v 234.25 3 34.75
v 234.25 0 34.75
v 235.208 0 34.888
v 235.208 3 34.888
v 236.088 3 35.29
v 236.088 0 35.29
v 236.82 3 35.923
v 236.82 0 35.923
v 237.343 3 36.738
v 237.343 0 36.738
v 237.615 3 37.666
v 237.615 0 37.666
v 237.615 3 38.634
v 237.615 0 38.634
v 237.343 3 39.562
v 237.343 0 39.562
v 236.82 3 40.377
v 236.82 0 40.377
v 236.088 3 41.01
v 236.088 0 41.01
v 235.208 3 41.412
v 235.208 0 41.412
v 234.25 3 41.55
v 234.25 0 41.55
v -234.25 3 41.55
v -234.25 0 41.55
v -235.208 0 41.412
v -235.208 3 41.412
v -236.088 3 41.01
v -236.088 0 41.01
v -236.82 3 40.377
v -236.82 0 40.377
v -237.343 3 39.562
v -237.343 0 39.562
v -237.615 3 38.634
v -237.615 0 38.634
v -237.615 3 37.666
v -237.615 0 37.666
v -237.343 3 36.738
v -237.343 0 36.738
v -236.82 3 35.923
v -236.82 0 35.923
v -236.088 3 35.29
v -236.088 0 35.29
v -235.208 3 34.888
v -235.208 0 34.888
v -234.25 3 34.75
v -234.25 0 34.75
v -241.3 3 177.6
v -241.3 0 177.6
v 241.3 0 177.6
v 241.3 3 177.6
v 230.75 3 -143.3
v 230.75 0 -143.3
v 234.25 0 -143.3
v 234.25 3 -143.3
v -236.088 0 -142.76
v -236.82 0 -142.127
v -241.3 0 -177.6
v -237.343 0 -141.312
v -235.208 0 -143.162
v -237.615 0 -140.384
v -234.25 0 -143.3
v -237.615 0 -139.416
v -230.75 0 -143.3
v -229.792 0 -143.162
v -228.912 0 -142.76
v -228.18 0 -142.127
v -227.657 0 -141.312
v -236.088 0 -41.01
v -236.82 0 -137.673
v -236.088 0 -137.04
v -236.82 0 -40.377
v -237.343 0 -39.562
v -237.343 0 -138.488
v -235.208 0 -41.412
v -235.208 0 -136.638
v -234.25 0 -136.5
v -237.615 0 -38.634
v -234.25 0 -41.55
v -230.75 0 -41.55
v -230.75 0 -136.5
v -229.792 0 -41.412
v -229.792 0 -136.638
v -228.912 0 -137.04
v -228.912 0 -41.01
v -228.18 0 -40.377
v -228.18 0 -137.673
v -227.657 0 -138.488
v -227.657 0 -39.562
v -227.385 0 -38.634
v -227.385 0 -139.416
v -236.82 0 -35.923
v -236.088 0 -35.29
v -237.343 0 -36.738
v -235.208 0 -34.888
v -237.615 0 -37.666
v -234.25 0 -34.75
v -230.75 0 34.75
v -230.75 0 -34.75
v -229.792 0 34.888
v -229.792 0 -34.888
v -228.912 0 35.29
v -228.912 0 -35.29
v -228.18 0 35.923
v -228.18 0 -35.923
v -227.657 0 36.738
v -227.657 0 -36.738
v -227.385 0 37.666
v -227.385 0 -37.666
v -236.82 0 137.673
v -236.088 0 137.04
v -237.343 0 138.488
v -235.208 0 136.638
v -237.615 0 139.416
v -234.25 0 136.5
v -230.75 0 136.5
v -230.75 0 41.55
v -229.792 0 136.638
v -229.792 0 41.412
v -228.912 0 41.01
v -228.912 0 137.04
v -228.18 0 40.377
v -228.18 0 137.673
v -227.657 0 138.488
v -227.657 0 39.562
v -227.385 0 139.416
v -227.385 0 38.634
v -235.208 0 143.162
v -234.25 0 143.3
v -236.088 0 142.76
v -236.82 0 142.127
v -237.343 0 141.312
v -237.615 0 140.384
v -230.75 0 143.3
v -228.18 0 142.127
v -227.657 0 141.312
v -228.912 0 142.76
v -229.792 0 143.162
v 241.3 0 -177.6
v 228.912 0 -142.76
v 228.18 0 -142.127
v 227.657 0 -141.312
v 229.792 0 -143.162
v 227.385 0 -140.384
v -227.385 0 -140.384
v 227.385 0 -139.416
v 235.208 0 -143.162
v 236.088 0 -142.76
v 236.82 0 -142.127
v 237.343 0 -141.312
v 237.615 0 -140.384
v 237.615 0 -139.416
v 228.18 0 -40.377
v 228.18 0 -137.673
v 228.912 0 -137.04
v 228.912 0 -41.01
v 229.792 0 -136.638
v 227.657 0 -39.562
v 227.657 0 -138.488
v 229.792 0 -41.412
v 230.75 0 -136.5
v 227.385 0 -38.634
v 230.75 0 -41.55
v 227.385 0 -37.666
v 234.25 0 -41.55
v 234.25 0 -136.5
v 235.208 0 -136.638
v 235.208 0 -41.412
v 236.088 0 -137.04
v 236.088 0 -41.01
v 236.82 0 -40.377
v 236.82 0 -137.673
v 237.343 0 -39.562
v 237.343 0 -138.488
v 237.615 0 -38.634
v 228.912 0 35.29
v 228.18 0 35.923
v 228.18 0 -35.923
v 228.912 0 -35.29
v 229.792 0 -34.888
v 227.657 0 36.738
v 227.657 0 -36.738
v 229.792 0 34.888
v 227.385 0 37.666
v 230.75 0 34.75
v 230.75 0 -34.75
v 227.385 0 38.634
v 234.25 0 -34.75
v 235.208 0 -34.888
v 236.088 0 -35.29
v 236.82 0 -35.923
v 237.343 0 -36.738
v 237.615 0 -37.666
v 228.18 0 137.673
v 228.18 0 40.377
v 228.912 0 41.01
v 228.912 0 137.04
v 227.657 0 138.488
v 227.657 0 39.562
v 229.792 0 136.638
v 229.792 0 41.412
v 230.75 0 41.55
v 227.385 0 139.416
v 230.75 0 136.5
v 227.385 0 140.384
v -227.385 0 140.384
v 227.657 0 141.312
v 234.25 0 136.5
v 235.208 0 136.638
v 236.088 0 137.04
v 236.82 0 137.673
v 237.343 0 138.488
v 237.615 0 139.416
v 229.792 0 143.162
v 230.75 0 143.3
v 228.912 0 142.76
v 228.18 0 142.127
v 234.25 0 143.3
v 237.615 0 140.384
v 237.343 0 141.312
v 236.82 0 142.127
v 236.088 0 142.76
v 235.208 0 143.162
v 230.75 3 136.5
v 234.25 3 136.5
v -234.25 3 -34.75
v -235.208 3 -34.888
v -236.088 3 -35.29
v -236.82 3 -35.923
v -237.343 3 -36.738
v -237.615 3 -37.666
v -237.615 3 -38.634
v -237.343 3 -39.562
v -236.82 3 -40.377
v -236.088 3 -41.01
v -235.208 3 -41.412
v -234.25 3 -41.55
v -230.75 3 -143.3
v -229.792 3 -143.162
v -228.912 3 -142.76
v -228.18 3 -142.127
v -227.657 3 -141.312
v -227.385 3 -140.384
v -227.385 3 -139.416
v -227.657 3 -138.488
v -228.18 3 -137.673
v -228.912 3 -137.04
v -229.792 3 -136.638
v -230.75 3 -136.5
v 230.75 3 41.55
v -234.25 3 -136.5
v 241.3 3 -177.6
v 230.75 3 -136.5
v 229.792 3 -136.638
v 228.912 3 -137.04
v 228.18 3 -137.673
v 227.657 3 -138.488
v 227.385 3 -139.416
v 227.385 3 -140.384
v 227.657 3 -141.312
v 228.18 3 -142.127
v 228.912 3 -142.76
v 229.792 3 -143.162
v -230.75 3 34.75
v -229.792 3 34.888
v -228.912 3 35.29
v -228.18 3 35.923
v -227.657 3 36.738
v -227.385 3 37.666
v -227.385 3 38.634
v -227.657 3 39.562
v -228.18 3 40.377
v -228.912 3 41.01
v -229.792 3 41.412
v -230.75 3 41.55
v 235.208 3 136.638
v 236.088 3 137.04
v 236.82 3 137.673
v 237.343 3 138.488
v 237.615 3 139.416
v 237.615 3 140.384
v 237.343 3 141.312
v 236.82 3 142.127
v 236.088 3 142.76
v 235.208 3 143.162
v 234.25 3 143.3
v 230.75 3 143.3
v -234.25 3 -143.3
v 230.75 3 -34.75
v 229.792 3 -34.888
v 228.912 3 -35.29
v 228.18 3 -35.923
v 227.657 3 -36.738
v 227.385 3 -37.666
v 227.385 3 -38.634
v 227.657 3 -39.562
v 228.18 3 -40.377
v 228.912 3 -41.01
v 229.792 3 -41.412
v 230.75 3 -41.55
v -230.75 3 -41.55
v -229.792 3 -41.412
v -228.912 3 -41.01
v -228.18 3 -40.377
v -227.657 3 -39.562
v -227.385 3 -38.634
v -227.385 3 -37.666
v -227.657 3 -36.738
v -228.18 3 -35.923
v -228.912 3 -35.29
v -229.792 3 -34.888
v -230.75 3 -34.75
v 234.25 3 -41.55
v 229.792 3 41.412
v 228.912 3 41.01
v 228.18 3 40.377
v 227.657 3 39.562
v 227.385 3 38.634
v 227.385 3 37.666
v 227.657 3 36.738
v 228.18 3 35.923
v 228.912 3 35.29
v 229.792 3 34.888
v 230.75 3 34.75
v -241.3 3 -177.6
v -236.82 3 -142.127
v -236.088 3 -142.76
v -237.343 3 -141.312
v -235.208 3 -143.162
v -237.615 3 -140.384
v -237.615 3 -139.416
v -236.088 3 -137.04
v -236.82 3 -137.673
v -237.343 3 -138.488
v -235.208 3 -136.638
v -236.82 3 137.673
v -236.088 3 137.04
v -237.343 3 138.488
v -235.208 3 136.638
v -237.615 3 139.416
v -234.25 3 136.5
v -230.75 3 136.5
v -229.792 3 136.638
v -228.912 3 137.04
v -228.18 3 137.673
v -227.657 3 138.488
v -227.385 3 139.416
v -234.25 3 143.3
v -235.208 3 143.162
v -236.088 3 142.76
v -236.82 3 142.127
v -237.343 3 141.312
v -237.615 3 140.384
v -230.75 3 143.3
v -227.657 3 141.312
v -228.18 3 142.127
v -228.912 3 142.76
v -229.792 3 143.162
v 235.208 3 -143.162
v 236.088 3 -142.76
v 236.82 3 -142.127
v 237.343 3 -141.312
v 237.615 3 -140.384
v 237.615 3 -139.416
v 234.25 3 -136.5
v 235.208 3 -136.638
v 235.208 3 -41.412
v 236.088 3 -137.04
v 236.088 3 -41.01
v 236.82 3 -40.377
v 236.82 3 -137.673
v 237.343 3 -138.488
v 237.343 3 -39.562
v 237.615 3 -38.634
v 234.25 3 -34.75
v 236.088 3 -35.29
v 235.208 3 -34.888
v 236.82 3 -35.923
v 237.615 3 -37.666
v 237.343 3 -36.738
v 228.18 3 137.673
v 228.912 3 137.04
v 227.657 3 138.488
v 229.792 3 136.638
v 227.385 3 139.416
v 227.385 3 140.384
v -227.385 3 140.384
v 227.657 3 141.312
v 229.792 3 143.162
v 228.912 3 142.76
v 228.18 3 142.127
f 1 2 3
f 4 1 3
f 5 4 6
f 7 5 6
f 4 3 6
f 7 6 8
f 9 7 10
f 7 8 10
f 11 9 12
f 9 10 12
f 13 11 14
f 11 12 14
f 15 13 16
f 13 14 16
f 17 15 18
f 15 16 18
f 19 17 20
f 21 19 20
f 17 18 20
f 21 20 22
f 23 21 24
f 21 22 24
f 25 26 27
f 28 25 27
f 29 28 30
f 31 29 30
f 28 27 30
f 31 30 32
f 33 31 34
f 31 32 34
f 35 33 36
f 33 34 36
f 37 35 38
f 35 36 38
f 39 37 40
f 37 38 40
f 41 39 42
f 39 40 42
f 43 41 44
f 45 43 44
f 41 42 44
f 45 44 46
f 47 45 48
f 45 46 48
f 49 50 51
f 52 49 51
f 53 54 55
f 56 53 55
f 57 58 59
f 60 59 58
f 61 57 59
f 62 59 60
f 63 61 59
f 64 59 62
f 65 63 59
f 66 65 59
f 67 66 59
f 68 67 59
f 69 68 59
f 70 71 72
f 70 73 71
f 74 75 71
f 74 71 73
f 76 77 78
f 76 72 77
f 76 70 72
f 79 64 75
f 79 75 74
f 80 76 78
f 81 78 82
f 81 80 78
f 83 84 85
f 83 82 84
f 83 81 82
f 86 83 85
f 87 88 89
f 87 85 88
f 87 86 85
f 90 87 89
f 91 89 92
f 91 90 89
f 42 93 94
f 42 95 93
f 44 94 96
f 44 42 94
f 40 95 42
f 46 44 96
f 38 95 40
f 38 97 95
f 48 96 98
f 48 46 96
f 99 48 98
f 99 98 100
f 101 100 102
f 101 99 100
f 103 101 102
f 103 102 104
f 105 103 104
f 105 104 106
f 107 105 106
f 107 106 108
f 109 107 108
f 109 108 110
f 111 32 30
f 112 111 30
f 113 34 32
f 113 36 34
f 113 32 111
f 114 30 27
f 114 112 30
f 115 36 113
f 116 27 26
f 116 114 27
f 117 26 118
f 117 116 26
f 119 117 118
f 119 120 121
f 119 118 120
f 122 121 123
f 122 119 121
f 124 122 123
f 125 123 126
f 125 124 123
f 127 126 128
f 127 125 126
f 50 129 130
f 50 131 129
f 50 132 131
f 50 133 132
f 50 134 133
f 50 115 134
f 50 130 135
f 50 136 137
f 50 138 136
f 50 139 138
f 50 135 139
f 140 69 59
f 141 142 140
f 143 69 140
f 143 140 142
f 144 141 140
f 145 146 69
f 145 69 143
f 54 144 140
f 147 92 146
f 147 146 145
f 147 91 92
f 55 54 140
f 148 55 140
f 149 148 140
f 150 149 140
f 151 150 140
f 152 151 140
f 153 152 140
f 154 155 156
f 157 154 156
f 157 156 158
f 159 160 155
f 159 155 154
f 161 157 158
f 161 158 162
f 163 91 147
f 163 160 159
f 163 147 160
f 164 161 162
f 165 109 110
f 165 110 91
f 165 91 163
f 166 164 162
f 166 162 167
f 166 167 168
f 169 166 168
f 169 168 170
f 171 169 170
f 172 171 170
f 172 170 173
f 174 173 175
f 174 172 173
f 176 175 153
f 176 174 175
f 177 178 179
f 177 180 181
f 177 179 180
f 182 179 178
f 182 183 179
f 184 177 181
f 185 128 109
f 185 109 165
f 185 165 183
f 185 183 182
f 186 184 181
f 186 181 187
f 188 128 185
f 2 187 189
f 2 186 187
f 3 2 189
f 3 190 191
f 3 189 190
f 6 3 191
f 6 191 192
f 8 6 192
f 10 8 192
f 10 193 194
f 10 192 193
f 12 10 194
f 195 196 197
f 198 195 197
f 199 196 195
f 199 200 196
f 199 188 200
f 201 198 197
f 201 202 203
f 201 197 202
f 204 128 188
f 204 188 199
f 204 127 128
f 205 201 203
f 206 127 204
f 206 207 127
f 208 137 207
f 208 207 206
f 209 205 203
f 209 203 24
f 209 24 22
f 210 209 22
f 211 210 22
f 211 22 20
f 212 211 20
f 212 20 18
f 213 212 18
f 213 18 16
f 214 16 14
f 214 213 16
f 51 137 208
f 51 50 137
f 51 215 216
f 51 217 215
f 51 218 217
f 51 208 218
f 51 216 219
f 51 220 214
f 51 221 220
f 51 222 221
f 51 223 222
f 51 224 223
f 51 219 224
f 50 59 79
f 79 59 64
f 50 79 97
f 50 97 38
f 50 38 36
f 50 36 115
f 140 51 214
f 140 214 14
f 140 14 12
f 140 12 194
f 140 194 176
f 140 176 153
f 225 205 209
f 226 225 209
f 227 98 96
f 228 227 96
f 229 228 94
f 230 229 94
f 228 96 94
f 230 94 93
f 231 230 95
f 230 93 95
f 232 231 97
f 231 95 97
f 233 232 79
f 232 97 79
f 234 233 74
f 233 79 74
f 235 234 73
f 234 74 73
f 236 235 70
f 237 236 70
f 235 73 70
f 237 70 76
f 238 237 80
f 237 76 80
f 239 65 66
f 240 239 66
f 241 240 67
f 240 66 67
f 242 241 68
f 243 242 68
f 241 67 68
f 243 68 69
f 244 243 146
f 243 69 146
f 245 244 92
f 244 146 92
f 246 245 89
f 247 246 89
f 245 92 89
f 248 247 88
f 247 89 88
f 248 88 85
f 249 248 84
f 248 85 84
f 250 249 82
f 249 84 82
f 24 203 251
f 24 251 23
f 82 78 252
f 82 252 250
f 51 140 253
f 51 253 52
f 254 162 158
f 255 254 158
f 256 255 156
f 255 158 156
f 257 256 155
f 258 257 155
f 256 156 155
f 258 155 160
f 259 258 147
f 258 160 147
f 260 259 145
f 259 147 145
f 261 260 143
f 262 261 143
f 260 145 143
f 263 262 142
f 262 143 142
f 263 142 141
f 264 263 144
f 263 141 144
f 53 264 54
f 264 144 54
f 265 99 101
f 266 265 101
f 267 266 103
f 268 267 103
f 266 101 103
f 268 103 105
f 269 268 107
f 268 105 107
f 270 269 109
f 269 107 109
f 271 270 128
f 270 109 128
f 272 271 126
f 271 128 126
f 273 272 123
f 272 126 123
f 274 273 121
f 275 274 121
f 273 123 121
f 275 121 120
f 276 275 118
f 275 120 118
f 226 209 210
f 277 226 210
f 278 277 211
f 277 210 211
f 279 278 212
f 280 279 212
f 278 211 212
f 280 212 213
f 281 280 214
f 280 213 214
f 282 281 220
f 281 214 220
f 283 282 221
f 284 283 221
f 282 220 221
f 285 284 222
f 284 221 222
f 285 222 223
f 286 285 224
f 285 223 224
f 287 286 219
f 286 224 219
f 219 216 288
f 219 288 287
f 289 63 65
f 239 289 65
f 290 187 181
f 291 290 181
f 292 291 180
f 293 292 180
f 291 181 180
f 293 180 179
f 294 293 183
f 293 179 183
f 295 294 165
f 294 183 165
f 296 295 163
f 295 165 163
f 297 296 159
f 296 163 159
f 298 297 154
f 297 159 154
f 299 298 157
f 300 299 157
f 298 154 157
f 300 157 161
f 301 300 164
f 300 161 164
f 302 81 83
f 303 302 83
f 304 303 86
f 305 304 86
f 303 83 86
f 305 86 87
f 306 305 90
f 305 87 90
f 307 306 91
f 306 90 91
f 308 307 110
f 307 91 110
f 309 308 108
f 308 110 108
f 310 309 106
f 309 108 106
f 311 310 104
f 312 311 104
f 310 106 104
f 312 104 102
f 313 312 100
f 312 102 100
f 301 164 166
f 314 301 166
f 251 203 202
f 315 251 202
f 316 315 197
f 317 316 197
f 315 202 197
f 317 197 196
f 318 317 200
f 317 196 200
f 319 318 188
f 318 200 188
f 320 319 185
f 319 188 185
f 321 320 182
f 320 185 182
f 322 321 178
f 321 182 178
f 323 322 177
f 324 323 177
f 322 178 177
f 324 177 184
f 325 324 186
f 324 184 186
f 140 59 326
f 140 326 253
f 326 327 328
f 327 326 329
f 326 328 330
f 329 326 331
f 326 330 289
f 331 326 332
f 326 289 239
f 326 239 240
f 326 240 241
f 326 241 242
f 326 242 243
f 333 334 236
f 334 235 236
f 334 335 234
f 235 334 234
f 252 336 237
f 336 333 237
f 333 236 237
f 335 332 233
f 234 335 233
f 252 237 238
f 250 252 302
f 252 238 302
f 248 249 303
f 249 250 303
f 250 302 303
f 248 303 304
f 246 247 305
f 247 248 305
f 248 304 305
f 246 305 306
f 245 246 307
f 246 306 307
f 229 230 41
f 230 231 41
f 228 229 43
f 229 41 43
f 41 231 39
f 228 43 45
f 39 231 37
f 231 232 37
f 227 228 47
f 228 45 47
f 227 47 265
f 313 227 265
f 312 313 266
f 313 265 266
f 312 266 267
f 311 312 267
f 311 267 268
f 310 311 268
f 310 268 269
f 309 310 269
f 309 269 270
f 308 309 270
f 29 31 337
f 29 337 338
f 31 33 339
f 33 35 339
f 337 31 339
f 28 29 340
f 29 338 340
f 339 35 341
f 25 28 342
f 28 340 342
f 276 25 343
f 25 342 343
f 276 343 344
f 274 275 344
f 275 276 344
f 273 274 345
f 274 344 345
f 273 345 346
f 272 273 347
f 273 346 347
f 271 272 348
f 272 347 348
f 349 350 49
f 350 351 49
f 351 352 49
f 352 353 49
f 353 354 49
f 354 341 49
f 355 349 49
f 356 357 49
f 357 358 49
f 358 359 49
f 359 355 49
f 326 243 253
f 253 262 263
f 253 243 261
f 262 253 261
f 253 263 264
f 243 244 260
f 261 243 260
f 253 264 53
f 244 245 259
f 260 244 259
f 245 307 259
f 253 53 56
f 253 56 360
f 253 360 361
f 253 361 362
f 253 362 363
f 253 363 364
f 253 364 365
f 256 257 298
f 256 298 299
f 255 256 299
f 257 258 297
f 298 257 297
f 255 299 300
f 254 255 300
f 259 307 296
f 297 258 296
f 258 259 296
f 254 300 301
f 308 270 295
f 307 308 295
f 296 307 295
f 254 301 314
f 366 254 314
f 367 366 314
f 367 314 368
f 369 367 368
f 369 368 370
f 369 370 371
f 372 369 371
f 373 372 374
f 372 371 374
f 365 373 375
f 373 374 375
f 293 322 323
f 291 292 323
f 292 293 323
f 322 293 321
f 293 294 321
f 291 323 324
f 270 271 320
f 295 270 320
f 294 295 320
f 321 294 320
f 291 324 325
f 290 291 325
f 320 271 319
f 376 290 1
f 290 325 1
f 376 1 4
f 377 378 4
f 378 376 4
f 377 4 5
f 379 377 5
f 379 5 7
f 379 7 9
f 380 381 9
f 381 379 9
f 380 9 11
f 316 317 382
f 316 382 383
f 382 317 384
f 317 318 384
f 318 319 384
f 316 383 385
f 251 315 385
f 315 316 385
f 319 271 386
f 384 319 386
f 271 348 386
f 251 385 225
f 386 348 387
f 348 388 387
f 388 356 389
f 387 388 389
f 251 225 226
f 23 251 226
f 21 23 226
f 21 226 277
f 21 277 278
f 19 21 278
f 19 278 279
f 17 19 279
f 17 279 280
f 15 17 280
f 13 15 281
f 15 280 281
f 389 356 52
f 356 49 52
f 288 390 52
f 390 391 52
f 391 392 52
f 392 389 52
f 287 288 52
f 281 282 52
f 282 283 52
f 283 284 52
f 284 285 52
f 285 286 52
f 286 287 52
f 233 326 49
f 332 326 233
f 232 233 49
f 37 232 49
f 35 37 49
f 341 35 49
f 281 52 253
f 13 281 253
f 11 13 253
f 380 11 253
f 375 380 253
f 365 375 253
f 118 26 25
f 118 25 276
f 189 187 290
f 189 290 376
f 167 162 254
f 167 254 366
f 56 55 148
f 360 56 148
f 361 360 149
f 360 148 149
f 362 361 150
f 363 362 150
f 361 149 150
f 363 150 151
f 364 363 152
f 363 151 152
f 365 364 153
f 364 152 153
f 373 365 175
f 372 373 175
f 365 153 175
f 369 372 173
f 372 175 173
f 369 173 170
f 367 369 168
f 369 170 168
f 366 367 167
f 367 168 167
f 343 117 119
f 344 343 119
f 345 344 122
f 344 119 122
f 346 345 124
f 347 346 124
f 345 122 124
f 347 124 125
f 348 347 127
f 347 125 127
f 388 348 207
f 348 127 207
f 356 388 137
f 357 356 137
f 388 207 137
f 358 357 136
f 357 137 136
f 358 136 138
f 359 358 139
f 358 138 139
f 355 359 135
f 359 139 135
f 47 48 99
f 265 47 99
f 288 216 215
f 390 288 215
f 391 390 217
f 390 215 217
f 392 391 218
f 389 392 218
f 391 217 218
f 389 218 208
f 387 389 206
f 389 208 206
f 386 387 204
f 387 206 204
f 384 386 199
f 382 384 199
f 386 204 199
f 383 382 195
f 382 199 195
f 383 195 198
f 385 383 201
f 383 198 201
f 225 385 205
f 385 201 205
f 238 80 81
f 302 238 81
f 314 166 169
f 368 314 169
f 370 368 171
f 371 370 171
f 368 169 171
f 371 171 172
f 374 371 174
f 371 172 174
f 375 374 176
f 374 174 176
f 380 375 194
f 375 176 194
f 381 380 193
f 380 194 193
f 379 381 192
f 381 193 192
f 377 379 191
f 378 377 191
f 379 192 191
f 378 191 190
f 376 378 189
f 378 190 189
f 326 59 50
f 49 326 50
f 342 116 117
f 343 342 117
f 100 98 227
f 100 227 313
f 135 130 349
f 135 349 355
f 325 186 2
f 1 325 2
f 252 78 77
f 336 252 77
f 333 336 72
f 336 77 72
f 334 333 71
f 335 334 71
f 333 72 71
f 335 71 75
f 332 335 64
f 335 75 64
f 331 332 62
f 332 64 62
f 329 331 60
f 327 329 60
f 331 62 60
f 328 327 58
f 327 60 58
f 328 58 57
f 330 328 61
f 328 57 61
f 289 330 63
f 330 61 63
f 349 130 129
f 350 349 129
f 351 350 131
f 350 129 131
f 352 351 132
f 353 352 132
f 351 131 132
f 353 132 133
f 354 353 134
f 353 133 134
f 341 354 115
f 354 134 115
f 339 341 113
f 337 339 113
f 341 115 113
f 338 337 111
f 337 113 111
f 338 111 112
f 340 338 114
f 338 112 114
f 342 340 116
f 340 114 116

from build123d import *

# Parameters (mm, degrees)
F0_W      = 482.6
F0_H      = 355.2
F1_DEPTH  = 3
F2_W      = 3.5
F2_H      = 6.8
F3_W      = 3.5
F3_H      = 6.8
F4_W      = 3.5
F4_H      = 6.8
F5_W      = 3.5
F5_H      = 6.8
F6_DEPTH  = 3
F7_W      = 3.5
F7_H      = 6.8
F8_W      = 3.5
F8_H      = 6.8
F9_W      = 3.5
F9_H      = 6.8
F10_W     = 3.5
F10_H     = 6.8
F11_DEPTH = 3


with BuildPart() as f1:
    # F0 (on Front) → F1 (new body)
    with BuildSketch(Plane.XZ):
        Rectangle(F0_W, F0_H)
    extrude(amount=-F1_DEPTH)

    # F2 (on face) + F3 (on face) + F4 (on face) + F5 (on face) → F6 (cut)
    with BuildSketch(Plane.XZ):
        with Locations((-232.5, 139.9)):
            Rectangle(F2_W, F2_H)
        with BuildLine():
            Line((-230.75, 143.3), (-230.75, 136.5))
            ThreePointArc((-230.75, 136.5), (-227.35, 139.9), (-230.75, 143.3))
        make_face()
        with BuildLine():
            ThreePointArc((-234.25, 143.3), (-237.65, 139.9), (-234.25, 136.5))
            Line((-234.25, 136.5), (-234.25, 143.3))
        make_face()
    with BuildSketch(Plane.XZ):
        with Locations((-232.5, 38.15)):
            Rectangle(F3_W, F3_H)
        with BuildLine():
            Line((-230.75, 41.55), (-230.75, 34.75))
            ThreePointArc((-230.75, 34.75), (-227.35, 38.15), (-230.75, 41.55))
        make_face()
        with BuildLine():
            ThreePointArc((-234.25, 41.55), (-237.65, 38.15), (-234.25, 34.75))
            Line((-234.25, 34.75), (-234.25, 41.55))
        make_face()
    with BuildSketch(Plane.XZ):
        with Locations((-232.5, -38.15)):
            Rectangle(F4_W, F4_H)
        with BuildLine():
            Line((-230.75, -34.75), (-230.75, -41.55))
            ThreePointArc((-230.75, -41.55), (-227.35, -38.15), (-230.75, -34.75))
        make_face()
        with BuildLine():
            ThreePointArc((-234.25, -34.75), (-237.65, -38.15), (-234.25, -41.55))
            Line((-234.25, -41.55), (-234.25, -34.75))
        make_face()
    with BuildSketch(Plane.XZ):
        with Locations((-232.5, -139.9)):
            Rectangle(F5_W, F5_H)
        with BuildLine():
            Line((-234.25, -143.3), (-234.25, -136.5))
            ThreePointArc((-234.25, -136.5), (-237.65, -139.9), (-234.25, -143.3))
        make_face()
        with BuildLine():
            ThreePointArc((-230.75, -143.3), (-227.35, -139.9), (-230.75, -136.5))
            Line((-230.75, -136.5), (-230.75, -143.3))
        make_face()
    extrude(amount=-F6_DEPTH, mode=Mode.SUBTRACT)

    # F7 (on face) + F8 (on face) + F9 (on face) + F10 (on face) → F11 (cut)
    with BuildSketch(Plane.XZ):
        with Locations((232.5, 139.9)):
            Rectangle(F7_W, F7_H)
        with BuildLine():
            Line((234.25, 143.3), (234.25, 136.5))
            ThreePointArc((234.25, 136.5), (237.65, 139.9), (234.25, 143.3))
        make_face()
        with BuildLine():
            ThreePointArc((230.75, 143.3), (227.35, 139.9), (230.75, 136.5))
            Line((230.75, 136.5), (230.75, 143.3))
        make_face()
    with BuildSketch(Plane.XZ):
        with Locations((232.5, 38.15)):
            Rectangle(F8_W, F8_H)
        with BuildLine():
            Line((234.25, 41.55), (234.25, 34.75))
            ThreePointArc((234.25, 34.75), (237.65, 38.15), (234.25, 41.55))
        make_face()
        with BuildLine():
            ThreePointArc((230.75, 41.55), (227.35, 38.15), (230.75, 34.75))
            Line((230.75, 34.75), (230.75, 41.55))
        make_face()
    with BuildSketch(Plane.XZ):
        with Locations((232.5, -38.15)):
            Rectangle(F9_W, F9_H)
        with BuildLine():
            Line((234.25, -34.75), (234.25, -41.55))
            ThreePointArc((234.25, -41.55), (237.65, -38.15), (234.25, -34.75))
        make_face()
        with BuildLine():
            ThreePointArc((230.75, -34.75), (227.35, -38.15), (230.75, -41.55))
            Line((230.75, -41.55), (230.75, -34.75))
        make_face()
    with BuildSketch(Plane.XZ):
        with Locations((232.5, -139.9)):
            Rectangle(F10_W, F10_H)
        with BuildLine():
            Line((234.25, -136.5), (234.25, -143.3))
            ThreePointArc((234.25, -143.3), (237.65, -139.9), (234.25, -136.5))
        make_face()
        with BuildLine():
            ThreePointArc((230.75, -136.5), (227.35, -139.9), (230.75, -143.3))
            Line((230.75, -143.3), (230.75, -136.5))
        make_face()
    extrude(amount=-F11_DEPTH, mode=Mode.SUBTRACT)


solid = f1.part
